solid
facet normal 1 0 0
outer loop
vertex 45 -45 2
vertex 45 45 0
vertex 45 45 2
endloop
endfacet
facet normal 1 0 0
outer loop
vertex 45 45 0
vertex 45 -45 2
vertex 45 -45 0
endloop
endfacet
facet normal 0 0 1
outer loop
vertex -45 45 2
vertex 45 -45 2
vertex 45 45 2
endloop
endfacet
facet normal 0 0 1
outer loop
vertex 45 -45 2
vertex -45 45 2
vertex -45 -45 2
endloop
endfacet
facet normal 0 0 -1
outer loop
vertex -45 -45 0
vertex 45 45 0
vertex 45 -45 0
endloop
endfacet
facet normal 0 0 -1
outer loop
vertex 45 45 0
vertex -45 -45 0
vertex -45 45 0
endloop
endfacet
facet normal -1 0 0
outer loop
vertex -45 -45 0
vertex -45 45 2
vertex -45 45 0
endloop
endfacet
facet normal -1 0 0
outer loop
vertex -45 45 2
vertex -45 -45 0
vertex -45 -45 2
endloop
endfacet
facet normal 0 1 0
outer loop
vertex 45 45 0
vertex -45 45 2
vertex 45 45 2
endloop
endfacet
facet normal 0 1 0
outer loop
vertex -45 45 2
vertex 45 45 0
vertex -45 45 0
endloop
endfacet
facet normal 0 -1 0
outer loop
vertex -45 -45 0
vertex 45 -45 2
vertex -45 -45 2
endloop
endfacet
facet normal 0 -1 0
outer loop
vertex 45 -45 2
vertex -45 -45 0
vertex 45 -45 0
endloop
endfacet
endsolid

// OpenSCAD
// Built by bench/smallmodels/features/compiler.py from a list of features.
$fn = 64;
difference() {
  union() {
    translate([0, 0, 0]) translate([-45, -45, 0]) cube([90, 90, 2]);
  }
  union() {
    translate([-20.8125, -20.8125, -2.5]) rotate([0, 0, 0]) translate([-35.75, -35.75, 0]) cube([71.5, 71.5, 2]);
    translate([-6.9375, -20.8125, -2.5]) rotate([0, 0, 0]) translate([-35.75, -35.75, 0]) cube([71.5, 71.5, 2]);
    translate([6.9375, -20.8125, -2.5]) rotate([0, 0, 0]) translate([-35.75, -35.75, 0]) cube([71.5, 71.5, 2]);
    translate([20.8125, -20.8125, -2.5]) rotate([0, 0, 0]) translate([-35.75, -35.75, 0]) cube([71.5, 71.5, 2]);
    translate([-20.8125, -6.9375, -2.5]) rotate([0, 0, 0]) translate([-35.75, -35.75, 0]) cube([71.5, 71.5, 2]);
    translate([-6.9375, -6.9375, -2.5]) rotate([0, 0, 0]) translate([-35.75, -35.75, 0]) cube([71.5, 71.5, 2]);
    translate([6.9375, -6.9375, -2.5]) rotate([0, 0, 0]) translate([-35.75, -35.75, 0]) cube([71.5, 71.5, 2]);
    translate([20.8125, -6.9375, -2.5]) rotate([0, 0, 0]) translate([-35.75, -35.75, 0]) cube([71.5, 71.5, 2]);
    translate([-20.8125, 6.9375, -2.5]) rotate([0, 0, 0]) translate([-35.75, -35.75, 0]) cube([71.5, 71.5, 2]);
    translate([-6.9375, 6.9375, -2.5]) rotate([0, 0, 0]) translate([-35.75, -35.75, 0]) cube([71.5, 71.5, 2]);
    translate([6.9375, 6.9375, -2.5]) rotate([0, 0, 0]) translate([-35.75, -35.75, 0]) cube([71.5, 71.5, 2]);
    translate([20.8125, 6.9375, -2.5]) rotate([0, 0, 0]) translate([-35.75, -35.75, 0]) cube([71.5, 71.5, 2]);
    translate([-20.8125, 20.8125, -2.5]) rotate([0, 0, 0]) translate([-35.75, -35.75, 0]) cube([71.5, 71.5, 2]);
    translate([-6.9375, 20.8125, -2.5]) rotate([0, 0, 0]) translate([-35.75, -35.75, 0]) cube([71.5, 71.5, 2]);
    translate([6.9375, 20.8125, -2.5]) rotate([0, 0, 0]) translate([-35.75, -35.75, 0]) cube([71.5, 71.5, 2]);
    translate([20.8125, 20.8125, -2.5]) rotate([0, 0, 0]) translate([-35.75, -35.75, 0]) cube([71.5, 71.5, 2]);
  }
}
